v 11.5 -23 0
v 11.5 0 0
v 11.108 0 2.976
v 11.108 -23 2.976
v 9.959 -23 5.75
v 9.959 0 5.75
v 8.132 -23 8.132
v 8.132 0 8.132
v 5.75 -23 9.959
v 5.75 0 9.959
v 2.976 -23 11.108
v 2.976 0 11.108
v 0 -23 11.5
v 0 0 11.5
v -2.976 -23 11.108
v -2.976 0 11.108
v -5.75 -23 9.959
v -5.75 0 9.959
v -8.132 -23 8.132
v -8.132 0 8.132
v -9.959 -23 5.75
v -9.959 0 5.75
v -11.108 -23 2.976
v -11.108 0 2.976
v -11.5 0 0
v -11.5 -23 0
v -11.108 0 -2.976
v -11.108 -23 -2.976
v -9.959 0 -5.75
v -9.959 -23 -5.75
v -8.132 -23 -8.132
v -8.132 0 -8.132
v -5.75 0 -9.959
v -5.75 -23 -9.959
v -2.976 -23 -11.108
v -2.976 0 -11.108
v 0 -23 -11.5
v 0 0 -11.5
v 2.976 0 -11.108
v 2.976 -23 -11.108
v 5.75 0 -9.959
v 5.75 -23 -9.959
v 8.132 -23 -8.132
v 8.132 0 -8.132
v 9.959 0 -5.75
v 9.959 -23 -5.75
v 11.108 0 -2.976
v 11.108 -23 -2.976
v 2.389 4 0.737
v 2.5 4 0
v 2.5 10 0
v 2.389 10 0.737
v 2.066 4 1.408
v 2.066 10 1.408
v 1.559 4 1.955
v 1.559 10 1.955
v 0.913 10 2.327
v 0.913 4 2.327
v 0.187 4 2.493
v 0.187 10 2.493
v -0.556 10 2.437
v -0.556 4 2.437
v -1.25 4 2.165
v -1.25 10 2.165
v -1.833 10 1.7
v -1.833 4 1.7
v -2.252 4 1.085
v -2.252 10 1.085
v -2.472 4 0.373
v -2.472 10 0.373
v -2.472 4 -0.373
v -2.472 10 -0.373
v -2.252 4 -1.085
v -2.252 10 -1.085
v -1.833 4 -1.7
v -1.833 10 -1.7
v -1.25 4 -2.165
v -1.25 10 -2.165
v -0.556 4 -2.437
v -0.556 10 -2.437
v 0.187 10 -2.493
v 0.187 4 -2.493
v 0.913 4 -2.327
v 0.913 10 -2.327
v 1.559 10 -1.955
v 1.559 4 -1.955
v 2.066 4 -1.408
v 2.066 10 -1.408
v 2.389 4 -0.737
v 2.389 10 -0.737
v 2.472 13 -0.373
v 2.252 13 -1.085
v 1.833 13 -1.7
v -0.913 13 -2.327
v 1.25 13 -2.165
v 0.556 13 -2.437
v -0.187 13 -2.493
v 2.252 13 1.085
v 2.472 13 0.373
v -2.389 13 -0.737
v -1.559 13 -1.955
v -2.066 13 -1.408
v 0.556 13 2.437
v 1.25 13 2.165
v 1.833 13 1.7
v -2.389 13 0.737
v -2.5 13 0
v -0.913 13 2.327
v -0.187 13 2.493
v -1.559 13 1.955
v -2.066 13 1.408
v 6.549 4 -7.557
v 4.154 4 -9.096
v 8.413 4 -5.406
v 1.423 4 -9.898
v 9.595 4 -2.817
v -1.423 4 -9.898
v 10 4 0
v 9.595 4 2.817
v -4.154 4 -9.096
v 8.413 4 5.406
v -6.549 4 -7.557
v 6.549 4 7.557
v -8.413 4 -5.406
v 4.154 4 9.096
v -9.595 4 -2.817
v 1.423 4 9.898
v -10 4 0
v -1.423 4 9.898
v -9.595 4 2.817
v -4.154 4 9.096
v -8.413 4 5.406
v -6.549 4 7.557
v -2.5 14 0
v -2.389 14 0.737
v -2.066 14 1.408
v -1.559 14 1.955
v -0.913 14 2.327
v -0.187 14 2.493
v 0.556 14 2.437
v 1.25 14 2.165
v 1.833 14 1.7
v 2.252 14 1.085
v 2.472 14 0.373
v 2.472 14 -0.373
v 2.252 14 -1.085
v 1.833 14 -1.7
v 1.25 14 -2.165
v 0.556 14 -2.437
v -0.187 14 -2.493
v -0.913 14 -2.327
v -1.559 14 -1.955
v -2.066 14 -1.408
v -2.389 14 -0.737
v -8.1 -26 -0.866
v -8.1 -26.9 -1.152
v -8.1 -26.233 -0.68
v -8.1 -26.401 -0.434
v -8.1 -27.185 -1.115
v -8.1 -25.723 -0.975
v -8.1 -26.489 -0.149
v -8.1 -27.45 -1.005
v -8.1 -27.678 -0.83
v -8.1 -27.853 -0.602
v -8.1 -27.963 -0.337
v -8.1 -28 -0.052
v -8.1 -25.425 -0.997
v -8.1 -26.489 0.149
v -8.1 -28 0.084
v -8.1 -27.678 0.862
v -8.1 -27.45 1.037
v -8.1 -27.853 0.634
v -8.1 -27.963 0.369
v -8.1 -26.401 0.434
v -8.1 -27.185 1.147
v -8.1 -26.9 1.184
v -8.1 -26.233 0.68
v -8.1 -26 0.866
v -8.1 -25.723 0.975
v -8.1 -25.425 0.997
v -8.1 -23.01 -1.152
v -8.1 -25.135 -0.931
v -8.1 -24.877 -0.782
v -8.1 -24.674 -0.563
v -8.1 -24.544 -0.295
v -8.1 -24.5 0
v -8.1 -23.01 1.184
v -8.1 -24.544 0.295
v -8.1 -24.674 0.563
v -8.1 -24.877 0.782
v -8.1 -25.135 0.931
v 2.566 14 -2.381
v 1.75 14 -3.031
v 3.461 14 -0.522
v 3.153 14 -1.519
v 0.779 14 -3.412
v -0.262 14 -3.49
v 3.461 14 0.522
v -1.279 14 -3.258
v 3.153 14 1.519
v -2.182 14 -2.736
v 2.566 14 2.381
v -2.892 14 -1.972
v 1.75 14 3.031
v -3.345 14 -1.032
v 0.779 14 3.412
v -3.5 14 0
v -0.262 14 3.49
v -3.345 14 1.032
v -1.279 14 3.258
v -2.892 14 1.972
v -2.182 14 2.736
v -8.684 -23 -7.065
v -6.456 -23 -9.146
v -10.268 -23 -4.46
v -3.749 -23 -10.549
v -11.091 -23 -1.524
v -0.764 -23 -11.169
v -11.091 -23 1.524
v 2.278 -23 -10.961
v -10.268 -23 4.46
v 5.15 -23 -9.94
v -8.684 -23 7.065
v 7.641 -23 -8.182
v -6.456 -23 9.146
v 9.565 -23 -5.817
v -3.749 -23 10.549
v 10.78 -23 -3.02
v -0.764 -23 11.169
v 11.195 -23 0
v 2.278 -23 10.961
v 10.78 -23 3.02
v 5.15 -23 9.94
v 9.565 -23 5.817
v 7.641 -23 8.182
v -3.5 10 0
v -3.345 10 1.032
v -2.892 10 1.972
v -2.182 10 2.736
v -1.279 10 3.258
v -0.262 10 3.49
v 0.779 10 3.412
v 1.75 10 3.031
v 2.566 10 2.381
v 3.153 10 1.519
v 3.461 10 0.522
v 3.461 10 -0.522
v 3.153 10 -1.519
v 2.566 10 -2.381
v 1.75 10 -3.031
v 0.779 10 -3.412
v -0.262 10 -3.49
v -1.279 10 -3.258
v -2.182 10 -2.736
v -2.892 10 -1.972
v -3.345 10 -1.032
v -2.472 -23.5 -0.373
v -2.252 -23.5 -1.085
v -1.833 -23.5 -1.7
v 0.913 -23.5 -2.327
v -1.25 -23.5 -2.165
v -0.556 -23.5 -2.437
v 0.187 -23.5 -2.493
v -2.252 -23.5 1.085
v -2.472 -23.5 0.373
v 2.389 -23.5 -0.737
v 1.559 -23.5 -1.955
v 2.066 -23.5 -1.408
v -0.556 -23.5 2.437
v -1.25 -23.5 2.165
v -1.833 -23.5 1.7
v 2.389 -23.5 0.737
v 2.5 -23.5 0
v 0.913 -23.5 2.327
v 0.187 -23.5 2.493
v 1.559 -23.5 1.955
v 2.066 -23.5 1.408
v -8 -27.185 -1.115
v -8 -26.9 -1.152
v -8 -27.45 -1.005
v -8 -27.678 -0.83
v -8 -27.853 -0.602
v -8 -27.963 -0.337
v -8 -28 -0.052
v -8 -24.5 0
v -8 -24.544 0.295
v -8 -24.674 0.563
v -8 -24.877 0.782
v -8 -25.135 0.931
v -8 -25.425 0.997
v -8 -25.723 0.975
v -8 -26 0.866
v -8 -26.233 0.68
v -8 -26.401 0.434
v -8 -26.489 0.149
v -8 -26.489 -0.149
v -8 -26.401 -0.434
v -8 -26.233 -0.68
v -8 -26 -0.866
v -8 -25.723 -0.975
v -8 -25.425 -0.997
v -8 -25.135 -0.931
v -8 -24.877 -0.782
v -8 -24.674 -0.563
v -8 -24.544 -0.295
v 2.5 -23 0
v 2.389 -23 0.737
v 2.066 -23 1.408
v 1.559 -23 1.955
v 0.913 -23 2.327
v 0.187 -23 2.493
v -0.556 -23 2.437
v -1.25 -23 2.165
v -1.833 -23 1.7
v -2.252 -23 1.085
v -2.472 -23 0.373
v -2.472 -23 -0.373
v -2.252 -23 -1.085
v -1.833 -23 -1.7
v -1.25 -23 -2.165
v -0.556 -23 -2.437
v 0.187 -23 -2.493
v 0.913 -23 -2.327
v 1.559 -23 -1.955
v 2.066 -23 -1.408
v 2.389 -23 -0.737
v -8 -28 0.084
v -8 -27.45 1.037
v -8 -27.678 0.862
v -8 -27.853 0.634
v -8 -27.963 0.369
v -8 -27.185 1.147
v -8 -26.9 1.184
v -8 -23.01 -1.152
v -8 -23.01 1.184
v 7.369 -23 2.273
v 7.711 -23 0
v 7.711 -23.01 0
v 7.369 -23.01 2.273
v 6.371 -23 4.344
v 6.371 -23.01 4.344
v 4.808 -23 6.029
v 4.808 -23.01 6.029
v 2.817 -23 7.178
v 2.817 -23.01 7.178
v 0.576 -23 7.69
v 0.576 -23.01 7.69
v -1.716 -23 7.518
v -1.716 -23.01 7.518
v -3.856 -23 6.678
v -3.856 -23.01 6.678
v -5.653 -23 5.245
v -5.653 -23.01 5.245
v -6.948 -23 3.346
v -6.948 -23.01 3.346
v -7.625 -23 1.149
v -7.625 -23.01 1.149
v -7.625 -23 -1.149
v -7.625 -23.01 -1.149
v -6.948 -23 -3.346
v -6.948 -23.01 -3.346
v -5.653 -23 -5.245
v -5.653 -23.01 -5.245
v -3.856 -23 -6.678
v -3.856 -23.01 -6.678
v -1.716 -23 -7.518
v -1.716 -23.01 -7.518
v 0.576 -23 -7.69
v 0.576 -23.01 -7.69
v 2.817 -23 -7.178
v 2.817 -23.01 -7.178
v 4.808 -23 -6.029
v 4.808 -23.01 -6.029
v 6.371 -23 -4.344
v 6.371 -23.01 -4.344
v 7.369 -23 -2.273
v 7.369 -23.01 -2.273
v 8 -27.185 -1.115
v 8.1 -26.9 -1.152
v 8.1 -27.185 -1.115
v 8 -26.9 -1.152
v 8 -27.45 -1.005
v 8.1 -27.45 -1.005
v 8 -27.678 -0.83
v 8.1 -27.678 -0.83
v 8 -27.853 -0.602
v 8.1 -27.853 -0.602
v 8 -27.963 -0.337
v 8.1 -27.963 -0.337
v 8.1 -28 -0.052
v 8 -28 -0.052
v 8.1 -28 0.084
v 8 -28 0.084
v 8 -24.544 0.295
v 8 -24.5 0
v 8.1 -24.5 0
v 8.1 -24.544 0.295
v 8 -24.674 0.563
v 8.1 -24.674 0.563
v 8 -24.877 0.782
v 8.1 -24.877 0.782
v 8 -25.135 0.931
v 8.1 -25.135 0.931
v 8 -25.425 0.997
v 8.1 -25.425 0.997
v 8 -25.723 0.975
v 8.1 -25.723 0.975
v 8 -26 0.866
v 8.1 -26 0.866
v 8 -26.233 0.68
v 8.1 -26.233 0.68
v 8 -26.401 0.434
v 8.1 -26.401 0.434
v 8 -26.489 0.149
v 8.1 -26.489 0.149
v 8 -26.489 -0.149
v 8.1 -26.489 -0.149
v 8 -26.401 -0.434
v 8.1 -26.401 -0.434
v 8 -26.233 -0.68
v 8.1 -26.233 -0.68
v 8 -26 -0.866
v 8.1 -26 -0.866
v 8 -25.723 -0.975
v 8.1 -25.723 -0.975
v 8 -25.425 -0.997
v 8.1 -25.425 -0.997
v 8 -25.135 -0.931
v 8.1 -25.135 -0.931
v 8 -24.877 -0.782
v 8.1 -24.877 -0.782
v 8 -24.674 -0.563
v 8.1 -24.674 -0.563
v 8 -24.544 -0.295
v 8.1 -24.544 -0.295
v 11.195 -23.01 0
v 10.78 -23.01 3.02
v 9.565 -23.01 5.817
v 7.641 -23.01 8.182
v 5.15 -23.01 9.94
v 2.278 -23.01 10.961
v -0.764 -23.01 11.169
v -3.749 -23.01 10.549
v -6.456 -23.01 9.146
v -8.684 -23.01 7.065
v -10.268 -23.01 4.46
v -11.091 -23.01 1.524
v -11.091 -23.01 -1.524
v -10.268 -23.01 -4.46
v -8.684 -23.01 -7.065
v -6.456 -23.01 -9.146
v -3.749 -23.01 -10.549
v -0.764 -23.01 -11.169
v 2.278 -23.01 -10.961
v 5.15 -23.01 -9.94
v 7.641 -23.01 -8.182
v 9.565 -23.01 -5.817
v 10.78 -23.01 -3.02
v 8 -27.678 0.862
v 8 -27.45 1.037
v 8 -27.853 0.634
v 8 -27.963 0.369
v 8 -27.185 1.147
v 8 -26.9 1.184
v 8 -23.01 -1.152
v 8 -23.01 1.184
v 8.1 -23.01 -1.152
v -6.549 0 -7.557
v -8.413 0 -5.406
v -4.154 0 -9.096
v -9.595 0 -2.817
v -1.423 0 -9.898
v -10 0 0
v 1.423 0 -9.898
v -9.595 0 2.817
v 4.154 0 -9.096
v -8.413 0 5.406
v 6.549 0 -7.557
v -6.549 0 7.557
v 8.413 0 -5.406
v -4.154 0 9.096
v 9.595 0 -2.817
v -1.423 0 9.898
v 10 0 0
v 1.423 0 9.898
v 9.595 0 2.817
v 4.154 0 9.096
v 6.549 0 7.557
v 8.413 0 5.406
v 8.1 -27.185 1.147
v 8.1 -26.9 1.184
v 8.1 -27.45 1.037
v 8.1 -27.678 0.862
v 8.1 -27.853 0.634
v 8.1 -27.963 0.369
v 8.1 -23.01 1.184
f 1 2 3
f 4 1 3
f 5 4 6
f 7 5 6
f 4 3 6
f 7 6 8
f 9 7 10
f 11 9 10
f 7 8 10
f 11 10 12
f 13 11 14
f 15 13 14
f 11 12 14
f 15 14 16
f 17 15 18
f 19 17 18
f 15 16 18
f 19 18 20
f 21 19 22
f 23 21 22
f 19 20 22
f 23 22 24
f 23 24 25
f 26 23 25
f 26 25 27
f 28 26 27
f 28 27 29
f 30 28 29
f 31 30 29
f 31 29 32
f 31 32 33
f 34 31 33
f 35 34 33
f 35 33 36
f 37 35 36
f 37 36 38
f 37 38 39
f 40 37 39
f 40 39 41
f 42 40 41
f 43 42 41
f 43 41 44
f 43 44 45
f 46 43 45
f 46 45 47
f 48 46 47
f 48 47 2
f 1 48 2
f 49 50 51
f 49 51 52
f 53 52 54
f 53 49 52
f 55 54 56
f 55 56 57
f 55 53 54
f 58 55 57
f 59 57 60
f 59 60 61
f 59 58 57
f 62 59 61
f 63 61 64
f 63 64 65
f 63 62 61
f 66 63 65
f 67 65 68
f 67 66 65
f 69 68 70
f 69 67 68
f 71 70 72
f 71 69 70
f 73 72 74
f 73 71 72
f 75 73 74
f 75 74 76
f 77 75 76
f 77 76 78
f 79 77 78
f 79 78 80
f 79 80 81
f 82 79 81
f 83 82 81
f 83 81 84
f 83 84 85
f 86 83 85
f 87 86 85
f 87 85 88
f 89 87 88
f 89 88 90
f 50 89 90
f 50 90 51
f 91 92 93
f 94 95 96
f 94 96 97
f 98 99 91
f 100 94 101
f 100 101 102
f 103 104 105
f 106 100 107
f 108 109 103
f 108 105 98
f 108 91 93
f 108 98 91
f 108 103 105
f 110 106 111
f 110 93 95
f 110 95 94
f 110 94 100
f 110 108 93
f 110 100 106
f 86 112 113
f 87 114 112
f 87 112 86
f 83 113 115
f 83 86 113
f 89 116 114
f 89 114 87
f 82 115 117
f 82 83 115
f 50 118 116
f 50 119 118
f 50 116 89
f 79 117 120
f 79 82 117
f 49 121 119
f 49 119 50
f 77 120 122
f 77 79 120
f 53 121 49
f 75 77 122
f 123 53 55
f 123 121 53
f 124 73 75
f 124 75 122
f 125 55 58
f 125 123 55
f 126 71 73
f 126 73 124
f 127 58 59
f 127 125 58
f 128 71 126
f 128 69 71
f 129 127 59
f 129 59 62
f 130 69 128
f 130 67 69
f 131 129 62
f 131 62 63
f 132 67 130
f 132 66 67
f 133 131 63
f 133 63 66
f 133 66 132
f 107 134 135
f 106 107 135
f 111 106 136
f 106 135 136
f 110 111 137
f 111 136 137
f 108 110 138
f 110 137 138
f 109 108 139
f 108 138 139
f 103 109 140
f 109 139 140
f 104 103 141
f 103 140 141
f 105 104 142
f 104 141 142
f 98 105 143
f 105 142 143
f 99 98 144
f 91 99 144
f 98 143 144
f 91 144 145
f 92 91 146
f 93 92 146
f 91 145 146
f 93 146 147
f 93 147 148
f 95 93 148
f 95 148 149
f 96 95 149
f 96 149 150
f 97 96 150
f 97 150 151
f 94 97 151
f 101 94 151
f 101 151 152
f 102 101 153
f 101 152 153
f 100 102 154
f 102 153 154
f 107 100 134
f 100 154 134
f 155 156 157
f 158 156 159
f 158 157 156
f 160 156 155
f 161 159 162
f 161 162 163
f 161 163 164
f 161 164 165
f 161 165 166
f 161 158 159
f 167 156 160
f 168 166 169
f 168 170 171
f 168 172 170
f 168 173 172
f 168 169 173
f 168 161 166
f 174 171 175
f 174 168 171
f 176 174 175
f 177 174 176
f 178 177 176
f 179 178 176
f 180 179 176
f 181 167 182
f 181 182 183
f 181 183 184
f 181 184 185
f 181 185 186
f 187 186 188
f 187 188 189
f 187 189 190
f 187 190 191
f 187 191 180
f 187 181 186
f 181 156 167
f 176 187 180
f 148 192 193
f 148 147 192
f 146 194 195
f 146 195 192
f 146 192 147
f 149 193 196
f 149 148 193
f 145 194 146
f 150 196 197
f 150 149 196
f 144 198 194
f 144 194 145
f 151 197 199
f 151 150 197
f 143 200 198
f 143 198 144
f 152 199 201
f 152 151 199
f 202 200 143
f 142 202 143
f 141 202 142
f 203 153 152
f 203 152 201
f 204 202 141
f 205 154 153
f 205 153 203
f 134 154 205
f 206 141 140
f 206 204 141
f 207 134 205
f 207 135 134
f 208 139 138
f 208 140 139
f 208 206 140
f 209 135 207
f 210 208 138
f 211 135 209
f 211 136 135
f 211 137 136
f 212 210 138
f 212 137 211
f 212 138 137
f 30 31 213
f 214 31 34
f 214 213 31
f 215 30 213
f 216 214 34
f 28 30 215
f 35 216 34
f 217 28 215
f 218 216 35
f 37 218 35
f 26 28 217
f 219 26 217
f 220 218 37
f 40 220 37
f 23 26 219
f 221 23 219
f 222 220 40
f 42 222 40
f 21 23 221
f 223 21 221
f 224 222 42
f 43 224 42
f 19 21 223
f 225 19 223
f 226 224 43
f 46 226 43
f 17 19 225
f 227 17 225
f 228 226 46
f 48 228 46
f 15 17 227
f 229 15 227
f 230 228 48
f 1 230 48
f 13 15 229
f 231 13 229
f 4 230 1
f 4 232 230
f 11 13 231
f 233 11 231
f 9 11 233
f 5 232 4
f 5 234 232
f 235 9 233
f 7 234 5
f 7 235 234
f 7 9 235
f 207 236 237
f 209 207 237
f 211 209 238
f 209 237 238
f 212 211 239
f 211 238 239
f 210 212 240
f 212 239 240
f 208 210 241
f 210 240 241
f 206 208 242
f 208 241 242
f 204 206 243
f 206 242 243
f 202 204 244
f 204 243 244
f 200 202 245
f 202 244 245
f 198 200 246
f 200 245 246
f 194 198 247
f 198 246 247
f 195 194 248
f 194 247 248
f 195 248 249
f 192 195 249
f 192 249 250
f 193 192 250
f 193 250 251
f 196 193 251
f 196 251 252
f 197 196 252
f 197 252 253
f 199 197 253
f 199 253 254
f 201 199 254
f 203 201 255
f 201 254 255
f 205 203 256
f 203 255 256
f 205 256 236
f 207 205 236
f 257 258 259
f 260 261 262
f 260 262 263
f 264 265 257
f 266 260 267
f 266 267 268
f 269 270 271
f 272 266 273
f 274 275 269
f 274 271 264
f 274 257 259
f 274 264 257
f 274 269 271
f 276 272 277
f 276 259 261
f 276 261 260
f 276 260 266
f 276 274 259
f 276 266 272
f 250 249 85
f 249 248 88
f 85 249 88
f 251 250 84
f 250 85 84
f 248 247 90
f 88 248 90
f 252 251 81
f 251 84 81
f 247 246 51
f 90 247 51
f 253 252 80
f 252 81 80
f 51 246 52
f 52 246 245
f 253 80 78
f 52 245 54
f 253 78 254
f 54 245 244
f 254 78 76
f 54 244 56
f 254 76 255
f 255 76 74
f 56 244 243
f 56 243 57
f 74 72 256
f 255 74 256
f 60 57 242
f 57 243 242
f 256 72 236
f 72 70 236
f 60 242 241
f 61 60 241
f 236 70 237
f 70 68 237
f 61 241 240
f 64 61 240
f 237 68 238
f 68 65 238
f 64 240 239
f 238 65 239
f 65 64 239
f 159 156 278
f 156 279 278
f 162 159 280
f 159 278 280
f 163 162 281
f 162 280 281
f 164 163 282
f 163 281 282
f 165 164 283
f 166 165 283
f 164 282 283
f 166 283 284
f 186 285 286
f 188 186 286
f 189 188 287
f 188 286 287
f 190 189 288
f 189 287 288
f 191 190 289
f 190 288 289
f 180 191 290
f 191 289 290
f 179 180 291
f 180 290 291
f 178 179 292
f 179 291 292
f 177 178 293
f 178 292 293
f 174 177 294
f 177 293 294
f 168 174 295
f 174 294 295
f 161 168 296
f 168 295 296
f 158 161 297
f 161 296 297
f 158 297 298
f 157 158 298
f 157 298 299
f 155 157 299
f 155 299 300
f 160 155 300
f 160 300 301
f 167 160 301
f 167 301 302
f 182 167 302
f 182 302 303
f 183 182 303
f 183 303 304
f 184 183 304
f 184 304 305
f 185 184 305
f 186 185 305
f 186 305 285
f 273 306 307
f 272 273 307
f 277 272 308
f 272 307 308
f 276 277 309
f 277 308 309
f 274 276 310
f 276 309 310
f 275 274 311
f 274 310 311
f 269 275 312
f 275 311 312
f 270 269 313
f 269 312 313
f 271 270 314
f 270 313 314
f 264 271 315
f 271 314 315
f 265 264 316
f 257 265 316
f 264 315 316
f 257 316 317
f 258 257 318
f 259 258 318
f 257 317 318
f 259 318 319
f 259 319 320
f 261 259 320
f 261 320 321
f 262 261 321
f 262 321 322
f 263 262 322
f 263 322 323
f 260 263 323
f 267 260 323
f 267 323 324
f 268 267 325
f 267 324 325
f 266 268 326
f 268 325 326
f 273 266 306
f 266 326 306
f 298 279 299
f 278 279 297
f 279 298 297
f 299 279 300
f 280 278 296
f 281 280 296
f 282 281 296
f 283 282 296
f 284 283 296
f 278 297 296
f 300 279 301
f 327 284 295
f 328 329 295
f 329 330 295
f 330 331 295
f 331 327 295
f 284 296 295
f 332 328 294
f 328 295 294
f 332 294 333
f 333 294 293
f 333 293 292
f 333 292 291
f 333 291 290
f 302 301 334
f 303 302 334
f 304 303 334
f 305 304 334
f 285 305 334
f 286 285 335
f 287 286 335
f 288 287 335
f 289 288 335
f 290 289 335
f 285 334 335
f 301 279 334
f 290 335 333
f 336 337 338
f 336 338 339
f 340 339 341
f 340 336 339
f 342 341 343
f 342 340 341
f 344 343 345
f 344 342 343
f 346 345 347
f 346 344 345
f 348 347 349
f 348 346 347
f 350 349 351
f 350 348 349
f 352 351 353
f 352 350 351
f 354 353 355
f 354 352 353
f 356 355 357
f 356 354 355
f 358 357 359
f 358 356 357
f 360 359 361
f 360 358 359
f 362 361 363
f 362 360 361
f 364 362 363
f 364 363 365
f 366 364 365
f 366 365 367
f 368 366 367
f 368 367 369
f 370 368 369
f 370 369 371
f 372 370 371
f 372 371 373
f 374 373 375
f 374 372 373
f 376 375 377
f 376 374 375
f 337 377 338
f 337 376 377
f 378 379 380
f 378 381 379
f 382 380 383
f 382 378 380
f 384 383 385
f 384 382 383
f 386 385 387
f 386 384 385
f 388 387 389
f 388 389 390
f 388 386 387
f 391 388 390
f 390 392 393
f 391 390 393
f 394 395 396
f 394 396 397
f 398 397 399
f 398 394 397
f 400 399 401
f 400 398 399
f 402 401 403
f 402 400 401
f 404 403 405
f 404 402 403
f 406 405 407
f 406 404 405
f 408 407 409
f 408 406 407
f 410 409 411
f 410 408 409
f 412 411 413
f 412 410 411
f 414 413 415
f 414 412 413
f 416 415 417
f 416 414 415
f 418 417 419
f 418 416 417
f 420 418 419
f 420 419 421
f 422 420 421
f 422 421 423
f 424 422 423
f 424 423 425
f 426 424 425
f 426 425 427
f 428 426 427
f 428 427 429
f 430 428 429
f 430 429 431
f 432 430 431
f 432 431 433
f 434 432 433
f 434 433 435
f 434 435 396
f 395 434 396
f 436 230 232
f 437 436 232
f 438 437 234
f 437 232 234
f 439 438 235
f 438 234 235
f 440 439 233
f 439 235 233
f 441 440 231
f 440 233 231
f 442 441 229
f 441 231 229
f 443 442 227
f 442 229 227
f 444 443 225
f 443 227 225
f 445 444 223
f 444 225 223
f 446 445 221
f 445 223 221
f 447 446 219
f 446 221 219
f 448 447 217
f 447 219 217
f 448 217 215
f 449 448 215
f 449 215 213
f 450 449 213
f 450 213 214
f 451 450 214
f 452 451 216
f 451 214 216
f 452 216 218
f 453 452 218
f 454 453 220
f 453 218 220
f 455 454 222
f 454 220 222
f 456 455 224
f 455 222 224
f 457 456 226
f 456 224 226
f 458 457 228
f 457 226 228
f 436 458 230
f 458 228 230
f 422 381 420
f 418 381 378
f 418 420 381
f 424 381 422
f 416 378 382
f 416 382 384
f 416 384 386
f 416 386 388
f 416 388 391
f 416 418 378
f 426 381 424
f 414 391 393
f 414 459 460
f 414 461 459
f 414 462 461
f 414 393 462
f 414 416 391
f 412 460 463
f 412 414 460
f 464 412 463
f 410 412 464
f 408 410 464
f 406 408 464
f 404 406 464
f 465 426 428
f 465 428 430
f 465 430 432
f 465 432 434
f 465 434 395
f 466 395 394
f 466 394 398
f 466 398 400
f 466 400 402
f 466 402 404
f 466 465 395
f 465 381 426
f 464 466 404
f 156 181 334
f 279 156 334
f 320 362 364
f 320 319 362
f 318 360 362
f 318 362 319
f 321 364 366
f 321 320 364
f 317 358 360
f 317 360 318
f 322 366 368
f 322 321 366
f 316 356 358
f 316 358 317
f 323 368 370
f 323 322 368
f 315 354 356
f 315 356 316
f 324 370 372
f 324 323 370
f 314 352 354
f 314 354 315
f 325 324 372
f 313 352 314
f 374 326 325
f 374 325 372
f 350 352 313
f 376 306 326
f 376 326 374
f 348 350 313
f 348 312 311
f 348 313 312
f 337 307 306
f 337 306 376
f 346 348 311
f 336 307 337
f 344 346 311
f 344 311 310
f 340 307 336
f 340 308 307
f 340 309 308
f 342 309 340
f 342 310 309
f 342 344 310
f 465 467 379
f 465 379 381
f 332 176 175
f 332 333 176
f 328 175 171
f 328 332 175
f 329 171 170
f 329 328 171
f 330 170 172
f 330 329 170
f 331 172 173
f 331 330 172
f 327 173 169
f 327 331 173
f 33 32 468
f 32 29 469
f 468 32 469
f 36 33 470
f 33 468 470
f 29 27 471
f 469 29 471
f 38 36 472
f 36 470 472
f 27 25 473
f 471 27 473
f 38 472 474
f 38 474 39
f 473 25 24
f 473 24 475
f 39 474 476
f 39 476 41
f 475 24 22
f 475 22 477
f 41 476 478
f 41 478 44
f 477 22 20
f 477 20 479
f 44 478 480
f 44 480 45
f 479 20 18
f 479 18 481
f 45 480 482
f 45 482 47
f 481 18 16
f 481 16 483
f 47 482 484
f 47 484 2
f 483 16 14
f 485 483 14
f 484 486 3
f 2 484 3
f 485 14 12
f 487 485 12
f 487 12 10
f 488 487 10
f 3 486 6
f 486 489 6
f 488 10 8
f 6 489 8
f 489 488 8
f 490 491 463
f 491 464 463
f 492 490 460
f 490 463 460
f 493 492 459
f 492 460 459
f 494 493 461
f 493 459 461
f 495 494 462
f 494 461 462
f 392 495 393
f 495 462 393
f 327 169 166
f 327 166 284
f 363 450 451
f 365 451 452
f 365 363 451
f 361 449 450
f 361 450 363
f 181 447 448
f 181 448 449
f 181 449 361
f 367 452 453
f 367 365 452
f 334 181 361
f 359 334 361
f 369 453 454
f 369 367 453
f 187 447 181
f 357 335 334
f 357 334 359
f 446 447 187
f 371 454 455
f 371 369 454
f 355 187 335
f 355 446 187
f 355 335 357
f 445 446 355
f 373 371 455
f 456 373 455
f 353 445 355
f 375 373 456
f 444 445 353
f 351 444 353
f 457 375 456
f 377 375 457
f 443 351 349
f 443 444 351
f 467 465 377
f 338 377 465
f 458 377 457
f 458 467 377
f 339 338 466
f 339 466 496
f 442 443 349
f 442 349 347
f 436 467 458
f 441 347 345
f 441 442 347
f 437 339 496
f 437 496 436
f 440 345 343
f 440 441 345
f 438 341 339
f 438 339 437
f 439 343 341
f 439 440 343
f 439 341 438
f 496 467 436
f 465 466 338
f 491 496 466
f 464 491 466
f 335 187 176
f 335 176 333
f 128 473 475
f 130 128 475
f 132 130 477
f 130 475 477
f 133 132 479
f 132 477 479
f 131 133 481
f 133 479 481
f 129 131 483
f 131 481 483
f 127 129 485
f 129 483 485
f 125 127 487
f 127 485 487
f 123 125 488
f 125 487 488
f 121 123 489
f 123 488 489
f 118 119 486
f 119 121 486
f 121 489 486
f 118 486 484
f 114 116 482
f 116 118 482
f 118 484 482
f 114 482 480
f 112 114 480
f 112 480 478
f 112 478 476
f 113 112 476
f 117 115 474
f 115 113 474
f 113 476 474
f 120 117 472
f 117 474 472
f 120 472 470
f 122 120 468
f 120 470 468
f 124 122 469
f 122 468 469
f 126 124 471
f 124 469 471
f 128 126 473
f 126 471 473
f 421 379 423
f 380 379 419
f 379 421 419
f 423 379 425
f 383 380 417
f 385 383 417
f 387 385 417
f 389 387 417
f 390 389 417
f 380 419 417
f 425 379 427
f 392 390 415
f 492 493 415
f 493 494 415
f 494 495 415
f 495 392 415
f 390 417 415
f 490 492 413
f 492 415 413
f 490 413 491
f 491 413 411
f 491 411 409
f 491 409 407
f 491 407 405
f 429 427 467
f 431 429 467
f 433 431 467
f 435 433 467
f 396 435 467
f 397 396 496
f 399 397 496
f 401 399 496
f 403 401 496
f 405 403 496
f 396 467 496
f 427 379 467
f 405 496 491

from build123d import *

# Parameters (mm, degrees)
F0_R      = 11.5
F1_DEPTH  = 23
F2_R      = 10
F3_DEPTH  = 4
F4_W      = 0.1
F4_H      = 2.3364797575
F5_DEPTH  = 5
F6_R      = 1
F7_DEPTH  = 25
F8_R      = 1.1
F10_R     = 2.5
F11_DEPTH = 33
F12_R     = 11.1951487388
F12_R_2   = 7.7112913891
F13_DEPTH = 0.01
F14_R     = 2.5
F15_DEPTH = 0.5
F16_R     = 3.5
F17_DEPTH = 4
F18_R     = 2.5
F19_DEPTH = 1


with BuildPart() as f1:
    # F0 (on Front) → F1 (new body)
    with BuildSketch(Plane.XZ):
        Circle(F0_R)
    extrude(amount=F1_DEPTH)

    # F2 (on face) → F3 (join)
    with BuildSketch(Plane(origin=(0, 0, 0), x_dir=(-1, 0, 0), z_dir=(0, 1, 0))):
        Circle(F2_R)
    extrude(amount=F3_DEPTH)

    # F4 (on face) → F5 (join)
    with BuildSketch(Plane.XZ.offset(23)):
        with Locations((-8.0499843252, 0.0158365793)):
            Rectangle(F4_W, F4_H)
    extrude(amount=F5_DEPTH)

    # F6 (on face) → F7 (cut)
    with BuildSketch(Plane.YZ.offset(-7.9999843252)):
        with Locations((-25.5, 0)):
            Circle(F6_R)
    extrude(amount=-F7_DEPTH, mode=Mode.SUBTRACT)

    # F8
    f8_edges = [f1.edges().sort_by_distance(p)[0] for p in [
        (-8.049984, -28, -1.152403),
        (-8.049984, -28, 1.184076),
    ]]
    fillet(f8_edges, radius=F8_R)

    # F9: F1 across plane


with BuildPart() as f1_1:
    add(f1.part)
    add(f1.part.mirror(Plane.YZ))

    # F10 (on face) → F11 (join)
    with BuildSketch(Plane.XZ.offset(23)):
        Circle(F10_R)
    extrude(amount=-F11_DEPTH)

    # F12 (on face) → F13 (join)
    with BuildSketch(Plane.XZ.offset(23)):
        Circle(F12_R)
        Circle(F12_R_2, mode=Mode.SUBTRACT)
    extrude(amount=F13_DEPTH)

    # F14 (on face) → F15 (join)
    with BuildSketch(Plane.XZ.offset(23)):
        Circle(F14_R)
    extrude(amount=F15_DEPTH)

    # F16 (on face) → F17 (join)
    with BuildSketch(Plane(origin=(0, 10, 0), x_dir=(-1, 0, 0), z_dir=(0, 1, 0))):
        Circle(F16_R)
    extrude(amount=F17_DEPTH)

    # F18 (on face) → F19 (cut)
    with BuildSketch(Plane(origin=(0, 14, 0), x_dir=(-1, 0, 0), z_dir=(0, 1, 0))):
        Circle(F18_R)
    extrude(amount=-F19_DEPTH, mode=Mode.SUBTRACT)


solid = f1_1.part
